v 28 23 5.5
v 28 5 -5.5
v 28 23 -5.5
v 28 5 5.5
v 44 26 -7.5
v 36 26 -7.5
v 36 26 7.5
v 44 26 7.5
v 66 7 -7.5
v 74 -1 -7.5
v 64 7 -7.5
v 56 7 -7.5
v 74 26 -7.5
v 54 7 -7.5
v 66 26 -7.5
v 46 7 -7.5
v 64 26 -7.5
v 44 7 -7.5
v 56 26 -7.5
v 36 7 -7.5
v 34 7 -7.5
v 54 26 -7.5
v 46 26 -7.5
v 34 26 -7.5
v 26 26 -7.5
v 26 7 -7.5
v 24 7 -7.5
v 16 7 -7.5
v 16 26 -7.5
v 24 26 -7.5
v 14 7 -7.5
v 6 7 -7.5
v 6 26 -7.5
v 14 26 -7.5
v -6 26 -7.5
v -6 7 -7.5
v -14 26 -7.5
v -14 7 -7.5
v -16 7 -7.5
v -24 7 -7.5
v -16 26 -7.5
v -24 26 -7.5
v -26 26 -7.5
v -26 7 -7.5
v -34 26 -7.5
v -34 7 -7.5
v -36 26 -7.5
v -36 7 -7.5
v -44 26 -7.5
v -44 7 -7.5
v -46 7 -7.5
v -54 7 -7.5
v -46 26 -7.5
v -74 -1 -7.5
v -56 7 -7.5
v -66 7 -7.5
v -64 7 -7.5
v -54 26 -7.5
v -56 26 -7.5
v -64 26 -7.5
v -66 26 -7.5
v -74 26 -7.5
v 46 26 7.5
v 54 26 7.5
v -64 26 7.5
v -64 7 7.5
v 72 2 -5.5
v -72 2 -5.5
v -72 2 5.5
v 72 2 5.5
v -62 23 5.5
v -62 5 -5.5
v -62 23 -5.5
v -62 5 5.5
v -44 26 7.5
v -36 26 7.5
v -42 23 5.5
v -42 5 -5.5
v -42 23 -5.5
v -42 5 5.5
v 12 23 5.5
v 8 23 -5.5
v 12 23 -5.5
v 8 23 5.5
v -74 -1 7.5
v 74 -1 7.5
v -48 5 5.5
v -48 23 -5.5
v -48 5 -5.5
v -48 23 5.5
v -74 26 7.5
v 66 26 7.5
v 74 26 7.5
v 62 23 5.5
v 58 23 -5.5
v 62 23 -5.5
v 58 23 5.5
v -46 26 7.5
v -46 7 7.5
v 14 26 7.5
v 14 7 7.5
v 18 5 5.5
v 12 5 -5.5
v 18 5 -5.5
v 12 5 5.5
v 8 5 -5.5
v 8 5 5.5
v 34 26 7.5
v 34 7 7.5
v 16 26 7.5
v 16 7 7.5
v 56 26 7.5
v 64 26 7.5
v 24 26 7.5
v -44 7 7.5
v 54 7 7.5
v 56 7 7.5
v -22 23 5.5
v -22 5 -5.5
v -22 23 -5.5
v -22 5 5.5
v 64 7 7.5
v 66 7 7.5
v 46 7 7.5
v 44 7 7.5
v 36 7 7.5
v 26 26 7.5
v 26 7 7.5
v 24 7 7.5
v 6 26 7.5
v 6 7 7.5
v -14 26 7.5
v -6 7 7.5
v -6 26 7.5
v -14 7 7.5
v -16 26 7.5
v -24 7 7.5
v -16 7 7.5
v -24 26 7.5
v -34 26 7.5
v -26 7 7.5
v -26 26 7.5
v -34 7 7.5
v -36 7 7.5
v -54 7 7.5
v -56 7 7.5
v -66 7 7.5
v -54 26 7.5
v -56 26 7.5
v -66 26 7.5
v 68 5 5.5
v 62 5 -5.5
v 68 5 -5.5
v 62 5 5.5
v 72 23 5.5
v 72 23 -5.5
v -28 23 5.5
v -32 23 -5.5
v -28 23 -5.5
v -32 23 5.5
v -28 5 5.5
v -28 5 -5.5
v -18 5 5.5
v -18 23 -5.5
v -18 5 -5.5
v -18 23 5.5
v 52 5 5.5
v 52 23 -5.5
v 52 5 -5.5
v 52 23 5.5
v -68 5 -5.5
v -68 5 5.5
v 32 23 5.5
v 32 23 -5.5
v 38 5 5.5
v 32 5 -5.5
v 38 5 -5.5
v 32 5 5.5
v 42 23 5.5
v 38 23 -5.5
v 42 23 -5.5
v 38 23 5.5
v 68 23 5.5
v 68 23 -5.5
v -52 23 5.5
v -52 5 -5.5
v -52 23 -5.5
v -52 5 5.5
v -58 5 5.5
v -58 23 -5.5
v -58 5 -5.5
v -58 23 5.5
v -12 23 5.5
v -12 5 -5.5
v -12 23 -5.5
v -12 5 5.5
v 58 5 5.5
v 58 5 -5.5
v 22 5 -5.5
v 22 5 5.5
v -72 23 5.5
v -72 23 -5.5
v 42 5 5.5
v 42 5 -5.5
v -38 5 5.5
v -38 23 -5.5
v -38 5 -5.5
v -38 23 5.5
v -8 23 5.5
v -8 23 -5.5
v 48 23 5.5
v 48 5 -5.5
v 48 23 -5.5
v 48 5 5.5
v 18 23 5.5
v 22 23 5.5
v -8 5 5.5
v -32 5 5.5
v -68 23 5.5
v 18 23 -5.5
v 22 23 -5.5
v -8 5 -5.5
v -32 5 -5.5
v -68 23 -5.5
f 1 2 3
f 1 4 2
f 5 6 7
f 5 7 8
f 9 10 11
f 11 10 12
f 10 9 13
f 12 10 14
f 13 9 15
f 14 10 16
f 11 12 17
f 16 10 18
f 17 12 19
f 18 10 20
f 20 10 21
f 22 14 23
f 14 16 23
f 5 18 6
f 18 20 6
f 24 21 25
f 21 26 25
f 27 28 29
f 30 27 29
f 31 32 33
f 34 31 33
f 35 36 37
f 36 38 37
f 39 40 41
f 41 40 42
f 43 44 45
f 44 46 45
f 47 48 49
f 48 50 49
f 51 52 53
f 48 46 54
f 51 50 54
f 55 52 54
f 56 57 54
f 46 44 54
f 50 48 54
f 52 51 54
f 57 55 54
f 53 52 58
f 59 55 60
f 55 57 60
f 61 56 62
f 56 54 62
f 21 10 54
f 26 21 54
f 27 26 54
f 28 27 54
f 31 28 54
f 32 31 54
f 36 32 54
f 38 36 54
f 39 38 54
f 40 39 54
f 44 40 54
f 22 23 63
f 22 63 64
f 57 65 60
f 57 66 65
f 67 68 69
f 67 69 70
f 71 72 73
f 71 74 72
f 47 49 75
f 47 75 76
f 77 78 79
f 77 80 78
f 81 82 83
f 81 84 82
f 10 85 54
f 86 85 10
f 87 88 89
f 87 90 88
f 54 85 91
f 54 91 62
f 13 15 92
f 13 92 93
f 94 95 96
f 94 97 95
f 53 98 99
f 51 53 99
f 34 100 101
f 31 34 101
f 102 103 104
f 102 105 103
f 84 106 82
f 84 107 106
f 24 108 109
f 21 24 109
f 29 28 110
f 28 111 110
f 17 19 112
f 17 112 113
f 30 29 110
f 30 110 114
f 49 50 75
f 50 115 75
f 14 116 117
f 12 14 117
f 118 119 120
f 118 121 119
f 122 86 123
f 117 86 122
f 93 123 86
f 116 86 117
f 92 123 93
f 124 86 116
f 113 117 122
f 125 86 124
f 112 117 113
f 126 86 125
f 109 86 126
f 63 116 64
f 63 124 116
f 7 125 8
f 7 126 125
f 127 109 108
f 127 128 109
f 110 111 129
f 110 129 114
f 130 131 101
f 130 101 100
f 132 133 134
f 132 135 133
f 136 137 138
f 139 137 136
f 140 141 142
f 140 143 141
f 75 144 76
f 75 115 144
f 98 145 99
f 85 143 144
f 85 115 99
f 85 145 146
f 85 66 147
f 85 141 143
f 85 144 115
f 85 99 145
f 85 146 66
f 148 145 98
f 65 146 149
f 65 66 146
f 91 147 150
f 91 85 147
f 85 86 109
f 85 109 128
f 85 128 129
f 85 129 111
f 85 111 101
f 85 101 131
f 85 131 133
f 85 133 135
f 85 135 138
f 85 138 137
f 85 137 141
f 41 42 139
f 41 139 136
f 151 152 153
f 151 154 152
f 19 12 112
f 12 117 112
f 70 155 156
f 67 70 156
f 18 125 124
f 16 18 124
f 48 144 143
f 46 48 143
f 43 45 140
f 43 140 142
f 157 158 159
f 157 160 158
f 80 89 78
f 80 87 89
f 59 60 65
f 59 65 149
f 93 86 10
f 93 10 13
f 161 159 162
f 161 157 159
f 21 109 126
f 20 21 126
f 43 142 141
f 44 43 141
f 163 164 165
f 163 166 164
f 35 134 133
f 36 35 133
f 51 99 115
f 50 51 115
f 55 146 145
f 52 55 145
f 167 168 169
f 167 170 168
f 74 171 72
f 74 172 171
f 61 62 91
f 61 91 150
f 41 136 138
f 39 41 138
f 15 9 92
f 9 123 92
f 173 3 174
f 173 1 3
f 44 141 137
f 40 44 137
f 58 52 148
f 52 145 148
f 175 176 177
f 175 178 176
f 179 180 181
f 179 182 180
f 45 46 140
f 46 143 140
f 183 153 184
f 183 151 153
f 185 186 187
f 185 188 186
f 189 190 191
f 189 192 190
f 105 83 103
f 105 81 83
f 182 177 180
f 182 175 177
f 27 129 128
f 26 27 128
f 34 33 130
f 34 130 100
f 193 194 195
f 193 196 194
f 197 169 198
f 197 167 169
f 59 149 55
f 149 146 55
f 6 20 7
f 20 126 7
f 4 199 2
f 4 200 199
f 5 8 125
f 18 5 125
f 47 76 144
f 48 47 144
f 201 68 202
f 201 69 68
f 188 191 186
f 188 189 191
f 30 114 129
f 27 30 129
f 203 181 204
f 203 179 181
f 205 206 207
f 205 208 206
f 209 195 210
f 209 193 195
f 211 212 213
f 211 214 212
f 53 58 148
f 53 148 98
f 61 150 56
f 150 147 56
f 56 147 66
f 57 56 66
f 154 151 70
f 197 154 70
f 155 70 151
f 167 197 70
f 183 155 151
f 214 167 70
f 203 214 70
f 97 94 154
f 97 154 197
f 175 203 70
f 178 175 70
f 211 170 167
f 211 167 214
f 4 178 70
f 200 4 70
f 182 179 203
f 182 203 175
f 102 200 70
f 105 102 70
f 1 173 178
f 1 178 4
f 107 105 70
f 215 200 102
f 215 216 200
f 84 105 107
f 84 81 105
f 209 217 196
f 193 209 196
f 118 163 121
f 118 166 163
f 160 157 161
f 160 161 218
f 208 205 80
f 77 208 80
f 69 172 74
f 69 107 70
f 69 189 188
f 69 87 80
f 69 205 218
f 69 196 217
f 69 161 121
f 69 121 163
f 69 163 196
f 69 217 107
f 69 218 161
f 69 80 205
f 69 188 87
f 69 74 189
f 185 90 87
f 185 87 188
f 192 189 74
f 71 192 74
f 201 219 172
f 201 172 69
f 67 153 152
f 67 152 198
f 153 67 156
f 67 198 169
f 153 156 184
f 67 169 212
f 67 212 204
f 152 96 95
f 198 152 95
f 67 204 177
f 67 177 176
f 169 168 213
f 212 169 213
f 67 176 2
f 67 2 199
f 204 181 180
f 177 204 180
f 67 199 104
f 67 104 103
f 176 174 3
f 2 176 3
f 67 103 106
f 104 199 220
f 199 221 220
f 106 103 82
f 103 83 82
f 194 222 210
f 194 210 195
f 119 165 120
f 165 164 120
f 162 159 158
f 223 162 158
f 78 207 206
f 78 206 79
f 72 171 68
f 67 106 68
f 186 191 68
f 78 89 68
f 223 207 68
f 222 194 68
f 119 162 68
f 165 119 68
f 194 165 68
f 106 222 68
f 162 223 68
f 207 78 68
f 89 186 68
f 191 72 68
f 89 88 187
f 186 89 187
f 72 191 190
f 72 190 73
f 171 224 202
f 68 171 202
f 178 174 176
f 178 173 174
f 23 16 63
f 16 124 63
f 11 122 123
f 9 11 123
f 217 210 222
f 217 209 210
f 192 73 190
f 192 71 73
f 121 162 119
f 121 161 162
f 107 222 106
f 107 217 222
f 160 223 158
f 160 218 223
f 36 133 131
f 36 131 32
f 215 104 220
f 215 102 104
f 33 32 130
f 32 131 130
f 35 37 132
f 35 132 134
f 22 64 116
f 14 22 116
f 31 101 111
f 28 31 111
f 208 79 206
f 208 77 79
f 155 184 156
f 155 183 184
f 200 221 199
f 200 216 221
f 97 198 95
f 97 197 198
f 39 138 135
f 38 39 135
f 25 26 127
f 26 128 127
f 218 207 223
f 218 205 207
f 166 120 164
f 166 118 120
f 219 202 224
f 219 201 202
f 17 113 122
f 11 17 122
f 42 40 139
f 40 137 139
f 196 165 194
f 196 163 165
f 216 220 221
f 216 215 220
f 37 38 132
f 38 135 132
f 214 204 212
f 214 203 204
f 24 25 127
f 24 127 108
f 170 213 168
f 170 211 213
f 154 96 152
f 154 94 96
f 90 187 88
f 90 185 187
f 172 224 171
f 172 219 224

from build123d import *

# Parameters (mm, degrees)
BOSS_EXTRUDE1_DEPTH     = 7.5
LPATTERN1_COUNT         = 8
LPATTERN1_PITCH         = 10
LPATTERN1_COL_COUNT     = 8
LPATTERN1_COL_PITCH     = 10
SHELL2_T                = -2
CUT_EXTRUDE2_DEPTH      = 15
CUT_EXTRUDE2_DEPTH_BACK = 80.411900871
SKETCH3_W               = 1
SKETCH3_H               = 7
SKETCH4_W               = 11
SKETCH4_H               = 3
BOSS_EXTRUDE2_DEPTH     = 2
SKETCH5_W               = 11
SKETCH5_H               = 4
BOSS_EXTRUDE3_DEPTH     = 2
SKETCH6_W               = 148
SKETCH6_H               = 1
BOSS_EXTRUDE4_DEPTH     = 7.5
SKETCH8_W               = 8
SKETCH8_H               = 15
BOSS_EXTRUDE5_DEPTH     = 1
LPATTERN2_COUNT         = 15
LPATTERN2_PITCH         = 10
SKETCH10_W              = 8
SKETCH10_H              = 15
CUT_EXTRUDE4_DEPTH      = 21
SKETCH11_W              = 15
SKETCH11_H              = 2
BOSS_EXTRUDE6_DEPTH     = 8


# Read off the part's stored shape, not the designer's step: Split1
with BuildPart() as part:
    # Sketch1 → Boss-Extrude1 (new, symmetric)
    with BuildSketch(Plane.XY):
        Polygon((0, 0), (-5, 0), (-5, 7), (-4, 7), (-4, 25), (4, 25), (4, 7), (5, 7), (5, 0), align=None)
    boss_extrude1 = extrude(amount=BOSS_EXTRUDE1_DEPTH, both=True)

    # LPattern1: Boss-Extrude1 ×8
    with Locations(*[(-i * LPATTERN1_PITCH, 0, 0) for i in range(1, LPATTERN1_COUNT)]):
        add(boss_extrude1)


with BuildPart() as lpattern1_col_1:
    # LPattern1 col: pattern copy
    add(boss_extrude1.moved(Location(Vector(1, 0, 0) * (1 * LPATTERN1_COL_PITCH))))


with BuildPart() as lpattern1_col_2:
    # LPattern1 col: pattern copy
    add(boss_extrude1.moved(Location(Vector(1, 0, 0) * (2 * LPATTERN1_COL_PITCH))))


with BuildPart() as lpattern1_col_3:
    # LPattern1 col: pattern copy
    add(boss_extrude1.moved(Location(Vector(1, 0, 0) * (3 * LPATTERN1_COL_PITCH))))


with BuildPart() as lpattern1_col_4:
    # LPattern1 col: pattern copy
    add(boss_extrude1.moved(Location(Vector(1, 0, 0) * (4 * LPATTERN1_COL_PITCH))))


with BuildPart() as lpattern1_col_5:
    # LPattern1 col: pattern copy
    add(boss_extrude1.moved(Location(Vector(1, 0, 0) * (5 * LPATTERN1_COL_PITCH))))


with BuildPart() as lpattern1_col_6:
    # LPattern1 col: pattern copy
    add(boss_extrude1.moved(Location(Vector(1, 0, 0) * (6 * LPATTERN1_COL_PITCH))))


with BuildPart() as lpattern1_col_7:
    # LPattern1 col: pattern copy
    add(boss_extrude1.moved(Location(Vector(1, 0, 0) * (7 * LPATTERN1_COL_PITCH))))


with BuildPart() as part_1:
    add(part.part)

    # LPattern1 col united with what the copie: union LPattern1 col_1, LPattern1 col_2, LPattern1 col_3, LPattern1 col_4, LPattern1 col_5, LPattern1 col_6, LPattern1 col_7
    add(lpattern1_col_1.part)
    add(lpattern1_col_2.part)
    add(lpattern1_col_3.part)
    add(lpattern1_col_4.part)
    add(lpattern1_col_5.part)
    add(lpattern1_col_6.part)
    add(lpattern1_col_7.part)

    # Shell2
    shell2_openings = [part_1.faces().sort_by_distance(p)[0] for p in [
        (75, 3.5, 0),
        (-75, 3.5, 0),
    ]]
    offset(amount=SHELL2_T, openings=shell2_openings, kind=Kind.INTERSECTION)

    # Sketch3 → Cut-Extrude2 (cut, two sides: drawn at the far end of the back side and taken through both)
    with BuildSketch(Plane.XY.offset(-CUT_EXTRUDE2_DEPTH_BACK)):
        with Locations((-74.5, 3.5)):
            Rectangle(SKETCH3_W, SKETCH3_H)
        with Locations((74.5, 3.5)):
            Rectangle(SKETCH3_W, SKETCH3_H)
    extrude(amount=CUT_EXTRUDE2_DEPTH + CUT_EXTRUDE2_DEPTH_BACK, mode=Mode.SUBTRACT)

    # Sketch4 → Boss-Extrude2 (add)
    with BuildSketch(Plane.ZY.offset(74)):
        with Locations((0, 3.5)):
            Rectangle(SKETCH4_W, SKETCH4_H)
    extrude(amount=-BOSS_EXTRUDE2_DEPTH)

    # Sketch5 → Boss-Extrude3 (add)
    with BuildSketch(Plane(origin=(74, 0, 0), x_dir=(0, 0, -1), z_dir=(1, 0, 0))):
        with Locations((0, 3)):
            Rectangle(SKETCH5_W, SKETCH5_H)
    extrude(amount=-BOSS_EXTRUDE3_DEPTH)

    # Sketch6 → Boss-Extrude4 (add, symmetric)
    with BuildSketch(Plane.XY):
        with Locations((0, -0.5)):
            Rectangle(SKETCH6_W, SKETCH6_H)
    extrude(amount=BOSS_EXTRUDE4_DEPTH, both=True)

    # Sketch8 → Boss-Extrude5 (add)
    with BuildSketch(Plane(origin=(0, 25, 0), x_dir=(1, 0, 0), z_dir=(0, 1, 0))):
        with Locations((-70, 0)):
            Rectangle(SKETCH8_W, SKETCH8_H)
    boss_extrude5 = extrude(amount=BOSS_EXTRUDE5_DEPTH)

    # LPattern2: Boss-Extrude5 ×15
    with Locations(*[(i * LPATTERN2_PITCH, 0, 0) for i in range(1, LPATTERN2_COUNT)]):
        add(boss_extrude5)


with BuildPart() as body_2:
    # Split1: the piece on the far side of the plane
    add(part_1.part)
    split(bisect_by=Plane(origin=(0, 2, 0), x_dir=(1, 0, 0), z_dir=(0, 1, 0)), keep=Keep.BOTTOM)


with BuildPart() as part_2:
    add(part_1.part)

    # Split1
    split(bisect_by=Plane(origin=(0, 2, 0), x_dir=(1, 0, 0), z_dir=(0, 1, 0)), keep=Keep.TOP)

    # Sketch10 → Cut-Extrude4 (cut)
    with BuildSketch(Plane(origin=(0, 26, 0), x_dir=(1, 0, 0), z_dir=(0, 1, 0))):
        Rectangle(SKETCH10_W, SKETCH10_H)
    extrude(amount=-CUT_EXTRUDE4_DEPTH, mode=Mode.SUBTRACT)

    # Sketch11 → Boss-Extrude6 (add)
    with BuildSketch(Plane(origin=(-4, 0, 0), x_dir=(0, 0, -1), z_dir=(1, 0, 0))):
        with Locations((0, 6)):
            Rectangle(SKETCH11_W, SKETCH11_H)
    extrude(amount=BOSS_EXTRUDE6_DEPTH)


with BuildPart() as body_2_1:
    add(body_2.part)

    # Combine1: union part
    add(part_2.part)


solid = body_2_1.part
